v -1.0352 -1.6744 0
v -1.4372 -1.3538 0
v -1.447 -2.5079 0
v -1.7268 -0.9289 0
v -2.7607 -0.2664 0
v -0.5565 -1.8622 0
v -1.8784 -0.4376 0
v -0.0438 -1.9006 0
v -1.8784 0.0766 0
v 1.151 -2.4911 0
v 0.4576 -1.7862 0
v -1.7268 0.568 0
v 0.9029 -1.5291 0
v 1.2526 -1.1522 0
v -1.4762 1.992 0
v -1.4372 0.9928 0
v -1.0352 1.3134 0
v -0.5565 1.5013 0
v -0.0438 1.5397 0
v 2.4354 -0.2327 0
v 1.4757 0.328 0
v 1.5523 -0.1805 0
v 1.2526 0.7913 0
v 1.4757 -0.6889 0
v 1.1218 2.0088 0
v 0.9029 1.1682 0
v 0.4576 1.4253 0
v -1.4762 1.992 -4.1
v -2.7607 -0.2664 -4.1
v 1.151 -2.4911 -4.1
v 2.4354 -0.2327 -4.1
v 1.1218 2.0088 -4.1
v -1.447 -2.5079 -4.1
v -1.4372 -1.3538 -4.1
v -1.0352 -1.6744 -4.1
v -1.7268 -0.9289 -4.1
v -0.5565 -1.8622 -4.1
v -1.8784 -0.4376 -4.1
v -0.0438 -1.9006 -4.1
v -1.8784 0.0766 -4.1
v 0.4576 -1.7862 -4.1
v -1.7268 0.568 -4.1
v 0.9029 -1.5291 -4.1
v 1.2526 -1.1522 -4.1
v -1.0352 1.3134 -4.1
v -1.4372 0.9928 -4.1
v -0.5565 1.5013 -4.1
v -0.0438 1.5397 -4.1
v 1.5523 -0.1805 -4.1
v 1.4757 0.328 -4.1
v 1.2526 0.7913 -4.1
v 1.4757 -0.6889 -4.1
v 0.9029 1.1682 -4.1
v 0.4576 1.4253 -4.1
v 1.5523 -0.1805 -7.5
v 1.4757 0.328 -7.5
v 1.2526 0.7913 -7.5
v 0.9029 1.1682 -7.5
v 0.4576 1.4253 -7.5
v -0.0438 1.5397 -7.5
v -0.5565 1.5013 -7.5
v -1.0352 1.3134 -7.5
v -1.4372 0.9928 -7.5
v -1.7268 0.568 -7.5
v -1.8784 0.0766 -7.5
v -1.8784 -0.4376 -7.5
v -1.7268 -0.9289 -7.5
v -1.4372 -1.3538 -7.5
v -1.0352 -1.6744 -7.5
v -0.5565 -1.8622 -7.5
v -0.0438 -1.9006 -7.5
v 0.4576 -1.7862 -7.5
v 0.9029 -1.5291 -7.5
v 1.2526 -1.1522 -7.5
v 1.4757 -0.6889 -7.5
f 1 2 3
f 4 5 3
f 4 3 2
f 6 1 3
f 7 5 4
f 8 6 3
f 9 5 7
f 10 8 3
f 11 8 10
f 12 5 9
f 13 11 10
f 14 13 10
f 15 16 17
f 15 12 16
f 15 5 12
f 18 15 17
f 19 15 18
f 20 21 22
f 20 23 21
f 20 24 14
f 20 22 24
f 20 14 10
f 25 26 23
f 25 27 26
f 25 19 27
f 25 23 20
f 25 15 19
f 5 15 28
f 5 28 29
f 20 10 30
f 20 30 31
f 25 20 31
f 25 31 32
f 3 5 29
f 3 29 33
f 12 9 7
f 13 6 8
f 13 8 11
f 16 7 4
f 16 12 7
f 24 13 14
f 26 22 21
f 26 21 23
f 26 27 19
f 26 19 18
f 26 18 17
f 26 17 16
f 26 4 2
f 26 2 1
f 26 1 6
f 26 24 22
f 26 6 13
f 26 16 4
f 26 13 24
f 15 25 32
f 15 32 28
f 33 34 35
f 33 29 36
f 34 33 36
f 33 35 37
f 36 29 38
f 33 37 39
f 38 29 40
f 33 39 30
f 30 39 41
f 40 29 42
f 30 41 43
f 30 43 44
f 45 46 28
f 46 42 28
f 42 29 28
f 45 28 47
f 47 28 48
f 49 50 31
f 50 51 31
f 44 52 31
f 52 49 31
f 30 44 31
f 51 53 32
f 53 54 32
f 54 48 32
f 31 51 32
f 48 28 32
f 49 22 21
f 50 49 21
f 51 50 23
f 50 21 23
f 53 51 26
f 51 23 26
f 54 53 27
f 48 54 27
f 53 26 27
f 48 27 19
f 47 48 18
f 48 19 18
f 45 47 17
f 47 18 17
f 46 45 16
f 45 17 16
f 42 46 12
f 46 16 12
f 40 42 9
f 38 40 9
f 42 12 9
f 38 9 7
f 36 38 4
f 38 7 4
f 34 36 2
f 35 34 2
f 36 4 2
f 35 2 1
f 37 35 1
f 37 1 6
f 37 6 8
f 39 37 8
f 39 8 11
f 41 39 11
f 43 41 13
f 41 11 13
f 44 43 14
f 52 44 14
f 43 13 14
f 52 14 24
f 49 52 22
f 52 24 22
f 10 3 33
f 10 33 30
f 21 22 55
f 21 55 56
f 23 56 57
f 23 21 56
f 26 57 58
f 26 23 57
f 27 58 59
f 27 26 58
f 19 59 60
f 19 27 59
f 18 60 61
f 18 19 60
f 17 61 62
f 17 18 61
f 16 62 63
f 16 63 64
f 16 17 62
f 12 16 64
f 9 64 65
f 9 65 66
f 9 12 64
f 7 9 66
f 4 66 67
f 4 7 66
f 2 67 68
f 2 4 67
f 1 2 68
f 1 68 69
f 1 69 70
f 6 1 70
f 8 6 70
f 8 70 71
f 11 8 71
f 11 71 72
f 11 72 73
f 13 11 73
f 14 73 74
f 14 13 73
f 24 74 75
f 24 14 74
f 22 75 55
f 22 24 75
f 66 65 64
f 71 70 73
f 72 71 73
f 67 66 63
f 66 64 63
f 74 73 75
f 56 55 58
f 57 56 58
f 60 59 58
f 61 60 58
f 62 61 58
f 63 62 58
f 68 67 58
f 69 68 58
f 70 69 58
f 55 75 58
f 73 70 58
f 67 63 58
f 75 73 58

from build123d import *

# Parameters (mm, degrees)
F0_R     = 1.725
F1_DEPTH = 4.1
F2_DEPTH = 7.5


with BuildPart() as f1:
    # F0 (on Top) → F1 (new body)
    with BuildSketch(Plane.XY):
        Polygon((-1.47625, 1.991959), (-2.760657, -0.266424), (-1.447043, -2.507946), (1.150978, -2.491084), (2.435386, -0.2327), (1.121772, 2.008822), align=None)
        with Locations((-0.172661, -0.18046)):
            Circle(F0_R, mode=Mode.SUBTRACT)
    extrude(amount=-F1_DEPTH)


with BuildPart() as f2:
    # F0 (on Top) → F2 (new body)
    with BuildSketch(Plane.XY):
        with Locations((-0.172661, -0.18046)):
            Circle(F0_R)
    extrude(amount=-F2_DEPTH)


solid = Compound([f1.part, f2.part])
